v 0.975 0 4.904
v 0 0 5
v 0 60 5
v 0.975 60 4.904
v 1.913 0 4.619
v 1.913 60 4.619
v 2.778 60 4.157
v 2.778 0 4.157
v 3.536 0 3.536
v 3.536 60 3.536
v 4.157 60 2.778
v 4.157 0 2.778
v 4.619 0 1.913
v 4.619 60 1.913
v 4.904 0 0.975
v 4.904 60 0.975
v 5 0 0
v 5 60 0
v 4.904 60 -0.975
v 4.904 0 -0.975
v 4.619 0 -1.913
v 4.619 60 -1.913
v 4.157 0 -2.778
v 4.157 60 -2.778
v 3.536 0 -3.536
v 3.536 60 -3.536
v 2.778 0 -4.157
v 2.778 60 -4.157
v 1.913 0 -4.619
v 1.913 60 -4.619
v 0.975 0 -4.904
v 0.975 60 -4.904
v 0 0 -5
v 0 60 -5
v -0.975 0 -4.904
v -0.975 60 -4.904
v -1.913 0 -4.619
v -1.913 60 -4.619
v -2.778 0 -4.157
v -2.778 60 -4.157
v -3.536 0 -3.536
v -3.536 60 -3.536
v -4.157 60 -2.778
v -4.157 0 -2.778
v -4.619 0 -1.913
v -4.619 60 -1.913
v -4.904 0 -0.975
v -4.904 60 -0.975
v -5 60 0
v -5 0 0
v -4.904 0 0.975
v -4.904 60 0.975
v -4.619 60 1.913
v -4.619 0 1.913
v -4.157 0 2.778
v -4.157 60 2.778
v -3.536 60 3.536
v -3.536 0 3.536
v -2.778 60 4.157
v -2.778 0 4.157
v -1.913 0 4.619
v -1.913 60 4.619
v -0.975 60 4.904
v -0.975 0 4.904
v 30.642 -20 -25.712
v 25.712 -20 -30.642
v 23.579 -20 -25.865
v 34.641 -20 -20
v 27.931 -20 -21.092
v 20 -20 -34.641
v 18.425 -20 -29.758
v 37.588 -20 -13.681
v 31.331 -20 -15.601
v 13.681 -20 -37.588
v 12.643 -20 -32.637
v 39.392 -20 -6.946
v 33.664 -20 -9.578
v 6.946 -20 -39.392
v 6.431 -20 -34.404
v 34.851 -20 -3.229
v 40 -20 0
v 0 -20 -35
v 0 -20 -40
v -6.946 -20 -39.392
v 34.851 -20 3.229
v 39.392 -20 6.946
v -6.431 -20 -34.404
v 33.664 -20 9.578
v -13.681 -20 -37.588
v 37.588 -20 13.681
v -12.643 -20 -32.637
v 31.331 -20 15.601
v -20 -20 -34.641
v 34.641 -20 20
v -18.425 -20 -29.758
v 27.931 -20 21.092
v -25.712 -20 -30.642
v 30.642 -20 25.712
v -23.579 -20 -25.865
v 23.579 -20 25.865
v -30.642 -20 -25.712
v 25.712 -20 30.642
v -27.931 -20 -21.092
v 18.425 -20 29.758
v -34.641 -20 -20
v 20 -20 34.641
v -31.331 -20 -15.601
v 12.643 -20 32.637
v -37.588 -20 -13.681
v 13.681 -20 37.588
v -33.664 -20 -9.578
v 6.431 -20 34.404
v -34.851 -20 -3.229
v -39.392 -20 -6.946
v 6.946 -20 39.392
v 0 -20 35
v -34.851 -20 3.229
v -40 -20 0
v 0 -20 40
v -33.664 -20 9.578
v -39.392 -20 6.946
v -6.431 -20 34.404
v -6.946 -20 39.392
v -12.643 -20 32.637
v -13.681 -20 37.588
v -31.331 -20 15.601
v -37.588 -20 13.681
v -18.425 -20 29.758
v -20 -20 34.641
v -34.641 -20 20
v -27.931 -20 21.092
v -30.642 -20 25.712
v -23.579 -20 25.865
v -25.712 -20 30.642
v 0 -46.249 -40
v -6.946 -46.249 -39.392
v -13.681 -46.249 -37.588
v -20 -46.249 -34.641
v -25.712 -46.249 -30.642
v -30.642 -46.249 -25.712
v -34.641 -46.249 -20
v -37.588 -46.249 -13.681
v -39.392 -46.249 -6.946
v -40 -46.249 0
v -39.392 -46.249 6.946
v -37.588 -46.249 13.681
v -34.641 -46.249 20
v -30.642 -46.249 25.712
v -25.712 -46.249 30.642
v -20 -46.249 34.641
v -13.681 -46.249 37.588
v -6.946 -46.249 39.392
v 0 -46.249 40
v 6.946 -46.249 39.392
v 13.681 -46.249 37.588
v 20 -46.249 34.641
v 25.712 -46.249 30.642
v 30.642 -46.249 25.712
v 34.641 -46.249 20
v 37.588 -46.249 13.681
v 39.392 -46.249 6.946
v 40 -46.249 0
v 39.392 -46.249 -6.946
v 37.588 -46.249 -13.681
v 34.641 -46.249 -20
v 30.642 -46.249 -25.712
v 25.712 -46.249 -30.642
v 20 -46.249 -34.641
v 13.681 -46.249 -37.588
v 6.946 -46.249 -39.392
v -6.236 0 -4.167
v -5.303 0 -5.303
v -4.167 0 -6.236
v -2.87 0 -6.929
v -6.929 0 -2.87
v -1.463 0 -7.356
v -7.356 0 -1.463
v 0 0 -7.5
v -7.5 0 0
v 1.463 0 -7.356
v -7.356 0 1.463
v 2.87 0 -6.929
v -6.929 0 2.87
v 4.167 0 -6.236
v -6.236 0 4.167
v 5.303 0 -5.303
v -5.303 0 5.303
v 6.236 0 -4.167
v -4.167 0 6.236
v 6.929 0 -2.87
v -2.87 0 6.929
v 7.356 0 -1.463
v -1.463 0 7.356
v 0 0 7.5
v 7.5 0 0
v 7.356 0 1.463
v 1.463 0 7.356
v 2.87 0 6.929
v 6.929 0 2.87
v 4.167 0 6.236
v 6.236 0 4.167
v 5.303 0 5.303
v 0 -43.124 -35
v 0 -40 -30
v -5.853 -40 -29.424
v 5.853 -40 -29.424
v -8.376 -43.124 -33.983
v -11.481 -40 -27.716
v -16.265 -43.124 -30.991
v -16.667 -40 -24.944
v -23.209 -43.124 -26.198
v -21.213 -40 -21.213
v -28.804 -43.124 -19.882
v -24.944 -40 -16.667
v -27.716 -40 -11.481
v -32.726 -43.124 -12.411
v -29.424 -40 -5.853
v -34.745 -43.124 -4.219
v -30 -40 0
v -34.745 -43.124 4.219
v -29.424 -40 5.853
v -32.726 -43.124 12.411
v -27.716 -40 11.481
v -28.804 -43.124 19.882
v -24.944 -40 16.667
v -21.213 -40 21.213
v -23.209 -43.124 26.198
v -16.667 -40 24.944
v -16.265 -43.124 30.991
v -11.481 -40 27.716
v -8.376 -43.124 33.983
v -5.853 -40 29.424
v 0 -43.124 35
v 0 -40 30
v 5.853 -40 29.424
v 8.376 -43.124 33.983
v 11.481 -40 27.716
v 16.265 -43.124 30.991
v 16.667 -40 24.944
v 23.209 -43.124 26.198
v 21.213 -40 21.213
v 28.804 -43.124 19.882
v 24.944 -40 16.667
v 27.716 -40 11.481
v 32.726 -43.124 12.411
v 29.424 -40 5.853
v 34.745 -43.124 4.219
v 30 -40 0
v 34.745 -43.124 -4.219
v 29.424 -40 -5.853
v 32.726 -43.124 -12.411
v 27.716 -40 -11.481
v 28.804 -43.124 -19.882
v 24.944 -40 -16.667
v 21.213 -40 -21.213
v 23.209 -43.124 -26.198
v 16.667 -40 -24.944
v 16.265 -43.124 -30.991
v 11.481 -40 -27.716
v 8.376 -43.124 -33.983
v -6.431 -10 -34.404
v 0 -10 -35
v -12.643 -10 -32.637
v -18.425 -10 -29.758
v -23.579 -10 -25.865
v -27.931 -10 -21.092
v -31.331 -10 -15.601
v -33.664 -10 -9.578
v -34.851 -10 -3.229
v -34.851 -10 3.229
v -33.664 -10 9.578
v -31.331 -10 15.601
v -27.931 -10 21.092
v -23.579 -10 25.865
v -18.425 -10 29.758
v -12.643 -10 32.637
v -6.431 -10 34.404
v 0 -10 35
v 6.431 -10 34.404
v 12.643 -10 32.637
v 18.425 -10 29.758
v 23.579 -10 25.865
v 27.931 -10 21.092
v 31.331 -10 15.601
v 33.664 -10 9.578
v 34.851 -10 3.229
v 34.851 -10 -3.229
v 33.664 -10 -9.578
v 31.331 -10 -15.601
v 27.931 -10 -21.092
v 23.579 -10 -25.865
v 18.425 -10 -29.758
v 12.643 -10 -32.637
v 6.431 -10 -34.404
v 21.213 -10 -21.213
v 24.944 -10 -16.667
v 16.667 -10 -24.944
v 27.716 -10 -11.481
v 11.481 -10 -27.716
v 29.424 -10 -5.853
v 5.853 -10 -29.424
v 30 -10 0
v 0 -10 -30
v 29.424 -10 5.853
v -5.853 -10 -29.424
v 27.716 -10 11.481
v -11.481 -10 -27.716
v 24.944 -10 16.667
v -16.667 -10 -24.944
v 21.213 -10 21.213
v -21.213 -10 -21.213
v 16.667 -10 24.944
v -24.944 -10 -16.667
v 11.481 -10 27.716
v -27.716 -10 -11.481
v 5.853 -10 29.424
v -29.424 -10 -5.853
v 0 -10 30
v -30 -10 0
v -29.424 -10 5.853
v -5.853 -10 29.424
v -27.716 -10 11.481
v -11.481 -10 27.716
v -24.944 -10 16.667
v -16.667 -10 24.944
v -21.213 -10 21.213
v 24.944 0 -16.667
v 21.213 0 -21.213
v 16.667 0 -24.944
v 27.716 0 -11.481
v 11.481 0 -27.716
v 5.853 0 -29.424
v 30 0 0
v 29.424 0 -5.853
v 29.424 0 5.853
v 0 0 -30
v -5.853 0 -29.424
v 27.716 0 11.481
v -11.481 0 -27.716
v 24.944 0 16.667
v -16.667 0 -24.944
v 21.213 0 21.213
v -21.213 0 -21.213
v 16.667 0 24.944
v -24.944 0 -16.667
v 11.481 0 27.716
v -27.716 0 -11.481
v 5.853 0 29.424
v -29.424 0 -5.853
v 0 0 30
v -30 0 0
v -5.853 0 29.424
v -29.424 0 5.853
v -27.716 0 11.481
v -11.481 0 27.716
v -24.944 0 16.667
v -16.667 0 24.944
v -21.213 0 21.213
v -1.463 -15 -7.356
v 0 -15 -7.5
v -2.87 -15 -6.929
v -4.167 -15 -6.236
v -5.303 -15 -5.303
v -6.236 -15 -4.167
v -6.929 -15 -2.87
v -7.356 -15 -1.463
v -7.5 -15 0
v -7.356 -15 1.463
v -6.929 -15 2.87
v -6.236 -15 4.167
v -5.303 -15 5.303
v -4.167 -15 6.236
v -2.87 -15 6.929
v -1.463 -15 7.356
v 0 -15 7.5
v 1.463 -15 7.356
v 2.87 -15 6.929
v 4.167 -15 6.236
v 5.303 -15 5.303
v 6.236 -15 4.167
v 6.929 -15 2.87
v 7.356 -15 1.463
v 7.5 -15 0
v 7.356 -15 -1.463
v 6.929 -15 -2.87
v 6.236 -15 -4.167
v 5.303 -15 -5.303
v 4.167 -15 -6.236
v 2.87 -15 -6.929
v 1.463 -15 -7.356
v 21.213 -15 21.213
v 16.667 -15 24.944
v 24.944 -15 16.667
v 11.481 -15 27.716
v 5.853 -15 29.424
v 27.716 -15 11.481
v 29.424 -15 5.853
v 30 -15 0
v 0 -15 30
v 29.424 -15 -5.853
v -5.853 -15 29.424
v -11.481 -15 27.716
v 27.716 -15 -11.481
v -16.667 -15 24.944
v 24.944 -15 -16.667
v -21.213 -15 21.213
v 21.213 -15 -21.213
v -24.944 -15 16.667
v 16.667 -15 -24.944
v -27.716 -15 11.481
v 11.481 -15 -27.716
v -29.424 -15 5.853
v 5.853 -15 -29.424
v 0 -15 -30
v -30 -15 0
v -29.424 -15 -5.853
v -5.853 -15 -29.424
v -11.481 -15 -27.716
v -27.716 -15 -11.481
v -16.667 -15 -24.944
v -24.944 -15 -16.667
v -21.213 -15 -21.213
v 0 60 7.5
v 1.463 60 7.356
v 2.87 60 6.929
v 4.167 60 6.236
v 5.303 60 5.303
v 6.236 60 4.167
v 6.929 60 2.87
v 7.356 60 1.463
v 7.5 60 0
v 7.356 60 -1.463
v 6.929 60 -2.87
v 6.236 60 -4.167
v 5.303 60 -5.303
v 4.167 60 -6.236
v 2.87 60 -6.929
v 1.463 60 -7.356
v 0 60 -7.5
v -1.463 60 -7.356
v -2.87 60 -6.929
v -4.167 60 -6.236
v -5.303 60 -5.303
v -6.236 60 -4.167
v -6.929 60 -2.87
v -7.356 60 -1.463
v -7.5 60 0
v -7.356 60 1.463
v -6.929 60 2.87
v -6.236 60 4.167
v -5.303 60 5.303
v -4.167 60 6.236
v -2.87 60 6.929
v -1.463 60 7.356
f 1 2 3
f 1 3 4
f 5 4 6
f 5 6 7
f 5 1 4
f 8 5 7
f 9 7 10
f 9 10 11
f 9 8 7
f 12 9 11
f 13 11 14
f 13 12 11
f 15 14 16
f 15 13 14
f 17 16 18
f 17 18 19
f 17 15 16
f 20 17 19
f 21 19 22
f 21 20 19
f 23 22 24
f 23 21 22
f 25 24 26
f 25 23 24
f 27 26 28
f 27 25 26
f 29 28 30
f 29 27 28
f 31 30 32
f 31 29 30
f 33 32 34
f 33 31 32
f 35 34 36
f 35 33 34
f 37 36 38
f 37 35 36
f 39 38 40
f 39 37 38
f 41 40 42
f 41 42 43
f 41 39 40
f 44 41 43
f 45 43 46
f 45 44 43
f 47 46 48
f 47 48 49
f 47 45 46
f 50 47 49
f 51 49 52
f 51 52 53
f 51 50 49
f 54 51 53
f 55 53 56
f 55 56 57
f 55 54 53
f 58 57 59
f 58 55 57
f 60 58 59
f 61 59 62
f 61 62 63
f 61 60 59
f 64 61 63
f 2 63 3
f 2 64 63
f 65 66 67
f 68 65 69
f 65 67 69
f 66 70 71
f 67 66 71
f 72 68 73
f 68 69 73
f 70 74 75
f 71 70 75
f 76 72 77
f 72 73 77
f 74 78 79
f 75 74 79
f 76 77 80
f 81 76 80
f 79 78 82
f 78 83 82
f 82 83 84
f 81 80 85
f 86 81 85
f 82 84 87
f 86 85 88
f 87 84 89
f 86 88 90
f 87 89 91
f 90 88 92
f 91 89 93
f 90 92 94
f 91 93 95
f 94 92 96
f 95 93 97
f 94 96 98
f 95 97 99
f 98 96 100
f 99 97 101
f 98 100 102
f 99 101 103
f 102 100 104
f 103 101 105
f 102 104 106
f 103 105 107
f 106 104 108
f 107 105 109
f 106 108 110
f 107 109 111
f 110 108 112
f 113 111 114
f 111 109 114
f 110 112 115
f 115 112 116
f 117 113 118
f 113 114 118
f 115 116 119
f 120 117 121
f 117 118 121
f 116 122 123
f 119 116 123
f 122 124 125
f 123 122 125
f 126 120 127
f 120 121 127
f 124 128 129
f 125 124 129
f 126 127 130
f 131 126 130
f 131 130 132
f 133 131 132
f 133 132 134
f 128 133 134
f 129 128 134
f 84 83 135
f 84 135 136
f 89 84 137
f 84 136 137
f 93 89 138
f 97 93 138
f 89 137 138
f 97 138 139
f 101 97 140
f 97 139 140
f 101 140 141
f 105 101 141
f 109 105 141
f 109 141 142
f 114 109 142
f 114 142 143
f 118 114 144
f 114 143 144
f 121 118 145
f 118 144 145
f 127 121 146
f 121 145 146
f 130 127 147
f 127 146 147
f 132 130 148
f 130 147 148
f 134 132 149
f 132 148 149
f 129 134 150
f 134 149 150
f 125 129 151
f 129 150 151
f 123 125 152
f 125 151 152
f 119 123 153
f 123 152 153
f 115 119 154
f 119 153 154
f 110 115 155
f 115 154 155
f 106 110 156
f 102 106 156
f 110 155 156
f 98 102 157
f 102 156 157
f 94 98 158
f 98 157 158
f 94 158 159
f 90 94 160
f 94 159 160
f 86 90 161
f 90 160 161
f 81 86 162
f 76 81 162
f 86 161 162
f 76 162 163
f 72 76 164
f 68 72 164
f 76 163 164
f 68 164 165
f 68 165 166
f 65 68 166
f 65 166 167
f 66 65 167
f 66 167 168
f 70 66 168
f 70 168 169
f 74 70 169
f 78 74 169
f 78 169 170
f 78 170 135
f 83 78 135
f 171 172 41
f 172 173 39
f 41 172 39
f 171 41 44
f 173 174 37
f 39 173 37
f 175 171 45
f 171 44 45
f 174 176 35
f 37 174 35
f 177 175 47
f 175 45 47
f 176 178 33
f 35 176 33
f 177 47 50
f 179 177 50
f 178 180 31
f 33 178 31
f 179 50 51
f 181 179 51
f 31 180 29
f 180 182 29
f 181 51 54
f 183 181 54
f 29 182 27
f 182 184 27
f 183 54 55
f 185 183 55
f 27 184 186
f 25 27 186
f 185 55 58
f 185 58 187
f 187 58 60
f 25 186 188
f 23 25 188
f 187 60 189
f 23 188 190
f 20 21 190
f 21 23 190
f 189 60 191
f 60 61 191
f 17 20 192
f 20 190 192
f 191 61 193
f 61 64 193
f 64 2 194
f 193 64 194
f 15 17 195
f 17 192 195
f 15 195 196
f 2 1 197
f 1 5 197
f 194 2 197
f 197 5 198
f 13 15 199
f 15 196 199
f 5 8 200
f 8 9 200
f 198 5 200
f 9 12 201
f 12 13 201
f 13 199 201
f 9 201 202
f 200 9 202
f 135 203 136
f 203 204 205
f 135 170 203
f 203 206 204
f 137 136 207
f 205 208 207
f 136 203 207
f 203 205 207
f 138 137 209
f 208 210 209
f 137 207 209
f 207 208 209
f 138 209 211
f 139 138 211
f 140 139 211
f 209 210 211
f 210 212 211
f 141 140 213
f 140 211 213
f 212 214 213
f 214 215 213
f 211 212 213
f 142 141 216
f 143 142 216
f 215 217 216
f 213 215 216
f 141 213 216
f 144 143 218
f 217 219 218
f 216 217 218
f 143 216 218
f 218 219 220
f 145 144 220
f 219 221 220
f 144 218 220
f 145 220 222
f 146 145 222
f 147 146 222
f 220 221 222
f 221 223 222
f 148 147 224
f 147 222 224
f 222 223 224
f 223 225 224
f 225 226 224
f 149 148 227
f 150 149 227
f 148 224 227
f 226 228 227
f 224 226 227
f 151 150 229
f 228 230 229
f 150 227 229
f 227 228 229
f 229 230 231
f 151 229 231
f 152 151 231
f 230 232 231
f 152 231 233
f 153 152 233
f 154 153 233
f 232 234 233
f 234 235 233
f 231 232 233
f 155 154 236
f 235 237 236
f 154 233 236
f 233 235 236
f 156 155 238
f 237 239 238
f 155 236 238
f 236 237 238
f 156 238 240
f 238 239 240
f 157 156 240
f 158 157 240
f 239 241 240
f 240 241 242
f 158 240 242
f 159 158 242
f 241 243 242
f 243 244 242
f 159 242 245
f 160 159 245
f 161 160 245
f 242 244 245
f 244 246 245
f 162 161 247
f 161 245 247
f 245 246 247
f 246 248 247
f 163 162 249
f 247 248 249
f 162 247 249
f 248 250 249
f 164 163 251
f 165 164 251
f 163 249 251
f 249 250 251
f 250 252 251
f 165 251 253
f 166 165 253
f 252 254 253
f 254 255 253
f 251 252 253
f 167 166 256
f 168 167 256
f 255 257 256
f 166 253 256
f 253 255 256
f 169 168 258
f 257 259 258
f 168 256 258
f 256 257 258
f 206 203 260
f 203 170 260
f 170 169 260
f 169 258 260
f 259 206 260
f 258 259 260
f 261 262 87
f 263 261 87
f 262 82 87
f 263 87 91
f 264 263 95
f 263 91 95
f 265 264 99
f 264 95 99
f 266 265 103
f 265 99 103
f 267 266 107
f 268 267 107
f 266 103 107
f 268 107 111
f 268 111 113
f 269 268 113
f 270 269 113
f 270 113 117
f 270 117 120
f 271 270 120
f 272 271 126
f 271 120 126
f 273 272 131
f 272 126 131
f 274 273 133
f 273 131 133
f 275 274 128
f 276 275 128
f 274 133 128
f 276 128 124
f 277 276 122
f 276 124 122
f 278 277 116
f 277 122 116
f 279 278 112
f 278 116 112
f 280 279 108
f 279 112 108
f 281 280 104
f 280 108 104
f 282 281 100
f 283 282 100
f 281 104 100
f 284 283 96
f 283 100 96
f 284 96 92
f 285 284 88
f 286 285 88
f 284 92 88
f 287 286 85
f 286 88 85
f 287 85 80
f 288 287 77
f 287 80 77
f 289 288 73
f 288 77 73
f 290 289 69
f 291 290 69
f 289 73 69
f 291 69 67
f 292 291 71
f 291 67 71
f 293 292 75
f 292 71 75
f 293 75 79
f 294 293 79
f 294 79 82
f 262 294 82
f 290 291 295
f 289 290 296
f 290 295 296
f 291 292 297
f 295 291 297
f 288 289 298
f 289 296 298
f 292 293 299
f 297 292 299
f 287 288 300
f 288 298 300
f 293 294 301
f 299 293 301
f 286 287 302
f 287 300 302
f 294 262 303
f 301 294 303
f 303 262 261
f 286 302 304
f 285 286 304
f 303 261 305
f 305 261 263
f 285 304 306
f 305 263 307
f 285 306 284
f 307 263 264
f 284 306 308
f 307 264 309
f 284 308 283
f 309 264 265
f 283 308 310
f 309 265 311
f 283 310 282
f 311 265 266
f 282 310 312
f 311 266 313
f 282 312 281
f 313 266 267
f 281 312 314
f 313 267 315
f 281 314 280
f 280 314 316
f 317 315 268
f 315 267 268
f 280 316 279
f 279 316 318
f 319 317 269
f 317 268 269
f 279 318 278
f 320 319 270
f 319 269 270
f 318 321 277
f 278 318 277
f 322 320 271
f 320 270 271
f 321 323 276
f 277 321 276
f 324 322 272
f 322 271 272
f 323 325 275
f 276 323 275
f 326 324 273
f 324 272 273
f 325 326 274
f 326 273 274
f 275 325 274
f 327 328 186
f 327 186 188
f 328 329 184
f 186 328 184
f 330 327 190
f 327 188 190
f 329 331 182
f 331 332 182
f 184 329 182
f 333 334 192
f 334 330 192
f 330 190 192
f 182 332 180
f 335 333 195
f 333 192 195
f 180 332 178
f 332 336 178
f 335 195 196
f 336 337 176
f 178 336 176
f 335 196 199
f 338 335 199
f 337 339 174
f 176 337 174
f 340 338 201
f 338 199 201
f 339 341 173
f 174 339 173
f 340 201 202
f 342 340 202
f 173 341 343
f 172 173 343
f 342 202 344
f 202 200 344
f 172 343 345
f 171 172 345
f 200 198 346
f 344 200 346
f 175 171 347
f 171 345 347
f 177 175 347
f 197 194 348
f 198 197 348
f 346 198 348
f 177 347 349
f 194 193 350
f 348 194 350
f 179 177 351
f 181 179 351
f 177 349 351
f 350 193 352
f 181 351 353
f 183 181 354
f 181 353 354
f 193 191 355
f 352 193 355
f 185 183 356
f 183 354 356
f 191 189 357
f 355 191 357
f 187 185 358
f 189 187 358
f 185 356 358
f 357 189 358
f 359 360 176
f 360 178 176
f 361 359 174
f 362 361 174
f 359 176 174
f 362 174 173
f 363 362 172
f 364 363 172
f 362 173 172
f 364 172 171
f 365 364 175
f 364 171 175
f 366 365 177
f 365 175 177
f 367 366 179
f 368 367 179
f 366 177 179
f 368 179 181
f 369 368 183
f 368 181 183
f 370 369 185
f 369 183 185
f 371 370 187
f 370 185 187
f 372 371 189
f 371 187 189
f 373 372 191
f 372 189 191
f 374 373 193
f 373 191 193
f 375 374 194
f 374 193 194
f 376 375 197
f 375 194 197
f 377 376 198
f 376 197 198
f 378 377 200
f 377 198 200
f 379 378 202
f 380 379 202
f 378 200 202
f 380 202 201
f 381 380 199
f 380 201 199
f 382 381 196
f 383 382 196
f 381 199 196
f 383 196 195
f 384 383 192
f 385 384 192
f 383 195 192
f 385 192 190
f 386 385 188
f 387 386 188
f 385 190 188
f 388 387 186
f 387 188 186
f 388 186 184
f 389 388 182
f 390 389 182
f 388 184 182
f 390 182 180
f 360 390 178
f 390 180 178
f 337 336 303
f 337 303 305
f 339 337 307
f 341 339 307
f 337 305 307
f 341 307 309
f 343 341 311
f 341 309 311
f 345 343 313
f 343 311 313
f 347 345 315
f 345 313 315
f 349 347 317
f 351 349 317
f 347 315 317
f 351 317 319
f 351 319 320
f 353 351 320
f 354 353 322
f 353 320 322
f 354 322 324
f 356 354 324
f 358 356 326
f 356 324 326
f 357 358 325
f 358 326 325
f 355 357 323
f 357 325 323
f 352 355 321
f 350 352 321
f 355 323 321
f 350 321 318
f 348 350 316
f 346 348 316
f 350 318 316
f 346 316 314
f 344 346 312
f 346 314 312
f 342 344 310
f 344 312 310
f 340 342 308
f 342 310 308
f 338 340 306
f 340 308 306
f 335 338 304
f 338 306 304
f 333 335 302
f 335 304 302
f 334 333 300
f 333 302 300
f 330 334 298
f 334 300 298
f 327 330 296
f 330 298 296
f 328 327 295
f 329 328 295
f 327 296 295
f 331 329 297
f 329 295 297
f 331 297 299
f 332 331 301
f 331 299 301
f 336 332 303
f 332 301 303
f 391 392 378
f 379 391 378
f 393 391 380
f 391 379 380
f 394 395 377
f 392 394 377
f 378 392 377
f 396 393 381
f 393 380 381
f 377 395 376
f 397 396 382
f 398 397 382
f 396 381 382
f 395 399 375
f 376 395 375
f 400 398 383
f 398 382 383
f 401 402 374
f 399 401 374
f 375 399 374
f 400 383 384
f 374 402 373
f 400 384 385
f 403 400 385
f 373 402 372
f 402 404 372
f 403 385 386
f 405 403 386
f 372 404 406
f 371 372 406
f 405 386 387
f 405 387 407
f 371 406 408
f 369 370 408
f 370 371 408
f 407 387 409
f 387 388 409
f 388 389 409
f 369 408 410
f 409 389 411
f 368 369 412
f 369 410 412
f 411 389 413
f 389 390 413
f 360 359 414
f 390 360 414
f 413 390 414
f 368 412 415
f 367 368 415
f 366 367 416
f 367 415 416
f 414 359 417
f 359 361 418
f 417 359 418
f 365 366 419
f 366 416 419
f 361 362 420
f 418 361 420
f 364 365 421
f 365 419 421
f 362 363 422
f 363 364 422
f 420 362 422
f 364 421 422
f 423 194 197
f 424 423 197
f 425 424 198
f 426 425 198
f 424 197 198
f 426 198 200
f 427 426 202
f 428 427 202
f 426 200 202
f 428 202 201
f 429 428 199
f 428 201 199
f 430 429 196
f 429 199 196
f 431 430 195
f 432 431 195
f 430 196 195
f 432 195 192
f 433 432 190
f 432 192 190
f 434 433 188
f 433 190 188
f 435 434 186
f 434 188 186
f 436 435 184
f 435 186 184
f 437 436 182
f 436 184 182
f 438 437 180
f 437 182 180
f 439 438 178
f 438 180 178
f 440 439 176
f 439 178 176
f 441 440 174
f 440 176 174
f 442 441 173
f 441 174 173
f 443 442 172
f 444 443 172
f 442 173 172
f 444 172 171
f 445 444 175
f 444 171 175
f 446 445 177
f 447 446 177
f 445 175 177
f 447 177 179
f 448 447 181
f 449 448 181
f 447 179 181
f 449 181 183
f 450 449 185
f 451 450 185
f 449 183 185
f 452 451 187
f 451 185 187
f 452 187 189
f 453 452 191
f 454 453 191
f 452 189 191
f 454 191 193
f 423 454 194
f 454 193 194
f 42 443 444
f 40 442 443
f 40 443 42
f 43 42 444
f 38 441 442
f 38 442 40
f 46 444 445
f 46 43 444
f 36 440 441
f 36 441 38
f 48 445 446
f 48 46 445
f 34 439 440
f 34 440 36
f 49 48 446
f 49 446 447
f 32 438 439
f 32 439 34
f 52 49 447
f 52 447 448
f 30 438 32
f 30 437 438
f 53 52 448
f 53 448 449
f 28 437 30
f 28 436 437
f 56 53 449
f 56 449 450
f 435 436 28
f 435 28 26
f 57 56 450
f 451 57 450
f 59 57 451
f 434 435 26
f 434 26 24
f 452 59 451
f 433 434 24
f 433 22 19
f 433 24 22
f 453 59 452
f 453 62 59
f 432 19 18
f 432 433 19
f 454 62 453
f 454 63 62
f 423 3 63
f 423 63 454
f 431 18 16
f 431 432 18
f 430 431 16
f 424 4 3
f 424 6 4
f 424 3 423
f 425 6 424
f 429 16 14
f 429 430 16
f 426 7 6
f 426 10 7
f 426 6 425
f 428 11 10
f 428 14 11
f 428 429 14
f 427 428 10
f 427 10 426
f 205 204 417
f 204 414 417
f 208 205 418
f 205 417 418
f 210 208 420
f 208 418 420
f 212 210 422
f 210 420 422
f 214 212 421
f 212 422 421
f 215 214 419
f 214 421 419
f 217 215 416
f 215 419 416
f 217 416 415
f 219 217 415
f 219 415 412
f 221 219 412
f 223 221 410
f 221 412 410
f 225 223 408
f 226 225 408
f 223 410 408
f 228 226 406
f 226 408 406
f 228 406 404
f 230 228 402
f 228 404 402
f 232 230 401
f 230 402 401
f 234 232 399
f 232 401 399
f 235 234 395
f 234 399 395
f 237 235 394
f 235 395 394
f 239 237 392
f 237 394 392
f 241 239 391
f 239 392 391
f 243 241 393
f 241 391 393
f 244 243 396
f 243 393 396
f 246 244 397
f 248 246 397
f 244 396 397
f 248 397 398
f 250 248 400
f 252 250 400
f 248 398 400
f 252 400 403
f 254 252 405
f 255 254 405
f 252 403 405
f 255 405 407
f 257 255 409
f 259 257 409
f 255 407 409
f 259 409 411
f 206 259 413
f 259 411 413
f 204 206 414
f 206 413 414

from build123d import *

# Parameters (mm, degrees)
SKETCH3_R           = 7.5
SKETCH3_R_2         = 5
BOSS_EXTRUDE1_DEPTH = 60


with BuildPart() as part:
    # Sketch3 → Boss-Extrude1 (new body)
    with BuildSketch(Plane(origin=(0, 0, 0), x_dir=(1, 0, 0), z_dir=(0, 1, 0))):
        with Locations(Location((0, 0, 0), (0, 0, 270))):
            Circle(SKETCH3_R)
        with Locations(Location((0, 0, 0), (0, 0, 270))):
            Circle(SKETCH3_R_2, mode=Mode.SUBTRACT)
    extrude(amount=BOSS_EXTRUDE1_DEPTH)


with BuildPart() as body_2:
    # Sketch4 → Revolve1 (revolve)
    with BuildSketch(Plane(origin=(0, 0, 0), x_dir=(0, 0, -1), z_dir=(1, 0, 0))):
        Polygon((7.5, 0), (30, 0), (30, -10), (35, -10), (35, -20), (40, -20), (40, -46.248693519), (30, -40), (30, -15), (7.5, -15), align=None)
    revolve(axis=Axis((0, 0, 0), (0, 1, 0)))


solid = Compound([part.part, body_2.part])
